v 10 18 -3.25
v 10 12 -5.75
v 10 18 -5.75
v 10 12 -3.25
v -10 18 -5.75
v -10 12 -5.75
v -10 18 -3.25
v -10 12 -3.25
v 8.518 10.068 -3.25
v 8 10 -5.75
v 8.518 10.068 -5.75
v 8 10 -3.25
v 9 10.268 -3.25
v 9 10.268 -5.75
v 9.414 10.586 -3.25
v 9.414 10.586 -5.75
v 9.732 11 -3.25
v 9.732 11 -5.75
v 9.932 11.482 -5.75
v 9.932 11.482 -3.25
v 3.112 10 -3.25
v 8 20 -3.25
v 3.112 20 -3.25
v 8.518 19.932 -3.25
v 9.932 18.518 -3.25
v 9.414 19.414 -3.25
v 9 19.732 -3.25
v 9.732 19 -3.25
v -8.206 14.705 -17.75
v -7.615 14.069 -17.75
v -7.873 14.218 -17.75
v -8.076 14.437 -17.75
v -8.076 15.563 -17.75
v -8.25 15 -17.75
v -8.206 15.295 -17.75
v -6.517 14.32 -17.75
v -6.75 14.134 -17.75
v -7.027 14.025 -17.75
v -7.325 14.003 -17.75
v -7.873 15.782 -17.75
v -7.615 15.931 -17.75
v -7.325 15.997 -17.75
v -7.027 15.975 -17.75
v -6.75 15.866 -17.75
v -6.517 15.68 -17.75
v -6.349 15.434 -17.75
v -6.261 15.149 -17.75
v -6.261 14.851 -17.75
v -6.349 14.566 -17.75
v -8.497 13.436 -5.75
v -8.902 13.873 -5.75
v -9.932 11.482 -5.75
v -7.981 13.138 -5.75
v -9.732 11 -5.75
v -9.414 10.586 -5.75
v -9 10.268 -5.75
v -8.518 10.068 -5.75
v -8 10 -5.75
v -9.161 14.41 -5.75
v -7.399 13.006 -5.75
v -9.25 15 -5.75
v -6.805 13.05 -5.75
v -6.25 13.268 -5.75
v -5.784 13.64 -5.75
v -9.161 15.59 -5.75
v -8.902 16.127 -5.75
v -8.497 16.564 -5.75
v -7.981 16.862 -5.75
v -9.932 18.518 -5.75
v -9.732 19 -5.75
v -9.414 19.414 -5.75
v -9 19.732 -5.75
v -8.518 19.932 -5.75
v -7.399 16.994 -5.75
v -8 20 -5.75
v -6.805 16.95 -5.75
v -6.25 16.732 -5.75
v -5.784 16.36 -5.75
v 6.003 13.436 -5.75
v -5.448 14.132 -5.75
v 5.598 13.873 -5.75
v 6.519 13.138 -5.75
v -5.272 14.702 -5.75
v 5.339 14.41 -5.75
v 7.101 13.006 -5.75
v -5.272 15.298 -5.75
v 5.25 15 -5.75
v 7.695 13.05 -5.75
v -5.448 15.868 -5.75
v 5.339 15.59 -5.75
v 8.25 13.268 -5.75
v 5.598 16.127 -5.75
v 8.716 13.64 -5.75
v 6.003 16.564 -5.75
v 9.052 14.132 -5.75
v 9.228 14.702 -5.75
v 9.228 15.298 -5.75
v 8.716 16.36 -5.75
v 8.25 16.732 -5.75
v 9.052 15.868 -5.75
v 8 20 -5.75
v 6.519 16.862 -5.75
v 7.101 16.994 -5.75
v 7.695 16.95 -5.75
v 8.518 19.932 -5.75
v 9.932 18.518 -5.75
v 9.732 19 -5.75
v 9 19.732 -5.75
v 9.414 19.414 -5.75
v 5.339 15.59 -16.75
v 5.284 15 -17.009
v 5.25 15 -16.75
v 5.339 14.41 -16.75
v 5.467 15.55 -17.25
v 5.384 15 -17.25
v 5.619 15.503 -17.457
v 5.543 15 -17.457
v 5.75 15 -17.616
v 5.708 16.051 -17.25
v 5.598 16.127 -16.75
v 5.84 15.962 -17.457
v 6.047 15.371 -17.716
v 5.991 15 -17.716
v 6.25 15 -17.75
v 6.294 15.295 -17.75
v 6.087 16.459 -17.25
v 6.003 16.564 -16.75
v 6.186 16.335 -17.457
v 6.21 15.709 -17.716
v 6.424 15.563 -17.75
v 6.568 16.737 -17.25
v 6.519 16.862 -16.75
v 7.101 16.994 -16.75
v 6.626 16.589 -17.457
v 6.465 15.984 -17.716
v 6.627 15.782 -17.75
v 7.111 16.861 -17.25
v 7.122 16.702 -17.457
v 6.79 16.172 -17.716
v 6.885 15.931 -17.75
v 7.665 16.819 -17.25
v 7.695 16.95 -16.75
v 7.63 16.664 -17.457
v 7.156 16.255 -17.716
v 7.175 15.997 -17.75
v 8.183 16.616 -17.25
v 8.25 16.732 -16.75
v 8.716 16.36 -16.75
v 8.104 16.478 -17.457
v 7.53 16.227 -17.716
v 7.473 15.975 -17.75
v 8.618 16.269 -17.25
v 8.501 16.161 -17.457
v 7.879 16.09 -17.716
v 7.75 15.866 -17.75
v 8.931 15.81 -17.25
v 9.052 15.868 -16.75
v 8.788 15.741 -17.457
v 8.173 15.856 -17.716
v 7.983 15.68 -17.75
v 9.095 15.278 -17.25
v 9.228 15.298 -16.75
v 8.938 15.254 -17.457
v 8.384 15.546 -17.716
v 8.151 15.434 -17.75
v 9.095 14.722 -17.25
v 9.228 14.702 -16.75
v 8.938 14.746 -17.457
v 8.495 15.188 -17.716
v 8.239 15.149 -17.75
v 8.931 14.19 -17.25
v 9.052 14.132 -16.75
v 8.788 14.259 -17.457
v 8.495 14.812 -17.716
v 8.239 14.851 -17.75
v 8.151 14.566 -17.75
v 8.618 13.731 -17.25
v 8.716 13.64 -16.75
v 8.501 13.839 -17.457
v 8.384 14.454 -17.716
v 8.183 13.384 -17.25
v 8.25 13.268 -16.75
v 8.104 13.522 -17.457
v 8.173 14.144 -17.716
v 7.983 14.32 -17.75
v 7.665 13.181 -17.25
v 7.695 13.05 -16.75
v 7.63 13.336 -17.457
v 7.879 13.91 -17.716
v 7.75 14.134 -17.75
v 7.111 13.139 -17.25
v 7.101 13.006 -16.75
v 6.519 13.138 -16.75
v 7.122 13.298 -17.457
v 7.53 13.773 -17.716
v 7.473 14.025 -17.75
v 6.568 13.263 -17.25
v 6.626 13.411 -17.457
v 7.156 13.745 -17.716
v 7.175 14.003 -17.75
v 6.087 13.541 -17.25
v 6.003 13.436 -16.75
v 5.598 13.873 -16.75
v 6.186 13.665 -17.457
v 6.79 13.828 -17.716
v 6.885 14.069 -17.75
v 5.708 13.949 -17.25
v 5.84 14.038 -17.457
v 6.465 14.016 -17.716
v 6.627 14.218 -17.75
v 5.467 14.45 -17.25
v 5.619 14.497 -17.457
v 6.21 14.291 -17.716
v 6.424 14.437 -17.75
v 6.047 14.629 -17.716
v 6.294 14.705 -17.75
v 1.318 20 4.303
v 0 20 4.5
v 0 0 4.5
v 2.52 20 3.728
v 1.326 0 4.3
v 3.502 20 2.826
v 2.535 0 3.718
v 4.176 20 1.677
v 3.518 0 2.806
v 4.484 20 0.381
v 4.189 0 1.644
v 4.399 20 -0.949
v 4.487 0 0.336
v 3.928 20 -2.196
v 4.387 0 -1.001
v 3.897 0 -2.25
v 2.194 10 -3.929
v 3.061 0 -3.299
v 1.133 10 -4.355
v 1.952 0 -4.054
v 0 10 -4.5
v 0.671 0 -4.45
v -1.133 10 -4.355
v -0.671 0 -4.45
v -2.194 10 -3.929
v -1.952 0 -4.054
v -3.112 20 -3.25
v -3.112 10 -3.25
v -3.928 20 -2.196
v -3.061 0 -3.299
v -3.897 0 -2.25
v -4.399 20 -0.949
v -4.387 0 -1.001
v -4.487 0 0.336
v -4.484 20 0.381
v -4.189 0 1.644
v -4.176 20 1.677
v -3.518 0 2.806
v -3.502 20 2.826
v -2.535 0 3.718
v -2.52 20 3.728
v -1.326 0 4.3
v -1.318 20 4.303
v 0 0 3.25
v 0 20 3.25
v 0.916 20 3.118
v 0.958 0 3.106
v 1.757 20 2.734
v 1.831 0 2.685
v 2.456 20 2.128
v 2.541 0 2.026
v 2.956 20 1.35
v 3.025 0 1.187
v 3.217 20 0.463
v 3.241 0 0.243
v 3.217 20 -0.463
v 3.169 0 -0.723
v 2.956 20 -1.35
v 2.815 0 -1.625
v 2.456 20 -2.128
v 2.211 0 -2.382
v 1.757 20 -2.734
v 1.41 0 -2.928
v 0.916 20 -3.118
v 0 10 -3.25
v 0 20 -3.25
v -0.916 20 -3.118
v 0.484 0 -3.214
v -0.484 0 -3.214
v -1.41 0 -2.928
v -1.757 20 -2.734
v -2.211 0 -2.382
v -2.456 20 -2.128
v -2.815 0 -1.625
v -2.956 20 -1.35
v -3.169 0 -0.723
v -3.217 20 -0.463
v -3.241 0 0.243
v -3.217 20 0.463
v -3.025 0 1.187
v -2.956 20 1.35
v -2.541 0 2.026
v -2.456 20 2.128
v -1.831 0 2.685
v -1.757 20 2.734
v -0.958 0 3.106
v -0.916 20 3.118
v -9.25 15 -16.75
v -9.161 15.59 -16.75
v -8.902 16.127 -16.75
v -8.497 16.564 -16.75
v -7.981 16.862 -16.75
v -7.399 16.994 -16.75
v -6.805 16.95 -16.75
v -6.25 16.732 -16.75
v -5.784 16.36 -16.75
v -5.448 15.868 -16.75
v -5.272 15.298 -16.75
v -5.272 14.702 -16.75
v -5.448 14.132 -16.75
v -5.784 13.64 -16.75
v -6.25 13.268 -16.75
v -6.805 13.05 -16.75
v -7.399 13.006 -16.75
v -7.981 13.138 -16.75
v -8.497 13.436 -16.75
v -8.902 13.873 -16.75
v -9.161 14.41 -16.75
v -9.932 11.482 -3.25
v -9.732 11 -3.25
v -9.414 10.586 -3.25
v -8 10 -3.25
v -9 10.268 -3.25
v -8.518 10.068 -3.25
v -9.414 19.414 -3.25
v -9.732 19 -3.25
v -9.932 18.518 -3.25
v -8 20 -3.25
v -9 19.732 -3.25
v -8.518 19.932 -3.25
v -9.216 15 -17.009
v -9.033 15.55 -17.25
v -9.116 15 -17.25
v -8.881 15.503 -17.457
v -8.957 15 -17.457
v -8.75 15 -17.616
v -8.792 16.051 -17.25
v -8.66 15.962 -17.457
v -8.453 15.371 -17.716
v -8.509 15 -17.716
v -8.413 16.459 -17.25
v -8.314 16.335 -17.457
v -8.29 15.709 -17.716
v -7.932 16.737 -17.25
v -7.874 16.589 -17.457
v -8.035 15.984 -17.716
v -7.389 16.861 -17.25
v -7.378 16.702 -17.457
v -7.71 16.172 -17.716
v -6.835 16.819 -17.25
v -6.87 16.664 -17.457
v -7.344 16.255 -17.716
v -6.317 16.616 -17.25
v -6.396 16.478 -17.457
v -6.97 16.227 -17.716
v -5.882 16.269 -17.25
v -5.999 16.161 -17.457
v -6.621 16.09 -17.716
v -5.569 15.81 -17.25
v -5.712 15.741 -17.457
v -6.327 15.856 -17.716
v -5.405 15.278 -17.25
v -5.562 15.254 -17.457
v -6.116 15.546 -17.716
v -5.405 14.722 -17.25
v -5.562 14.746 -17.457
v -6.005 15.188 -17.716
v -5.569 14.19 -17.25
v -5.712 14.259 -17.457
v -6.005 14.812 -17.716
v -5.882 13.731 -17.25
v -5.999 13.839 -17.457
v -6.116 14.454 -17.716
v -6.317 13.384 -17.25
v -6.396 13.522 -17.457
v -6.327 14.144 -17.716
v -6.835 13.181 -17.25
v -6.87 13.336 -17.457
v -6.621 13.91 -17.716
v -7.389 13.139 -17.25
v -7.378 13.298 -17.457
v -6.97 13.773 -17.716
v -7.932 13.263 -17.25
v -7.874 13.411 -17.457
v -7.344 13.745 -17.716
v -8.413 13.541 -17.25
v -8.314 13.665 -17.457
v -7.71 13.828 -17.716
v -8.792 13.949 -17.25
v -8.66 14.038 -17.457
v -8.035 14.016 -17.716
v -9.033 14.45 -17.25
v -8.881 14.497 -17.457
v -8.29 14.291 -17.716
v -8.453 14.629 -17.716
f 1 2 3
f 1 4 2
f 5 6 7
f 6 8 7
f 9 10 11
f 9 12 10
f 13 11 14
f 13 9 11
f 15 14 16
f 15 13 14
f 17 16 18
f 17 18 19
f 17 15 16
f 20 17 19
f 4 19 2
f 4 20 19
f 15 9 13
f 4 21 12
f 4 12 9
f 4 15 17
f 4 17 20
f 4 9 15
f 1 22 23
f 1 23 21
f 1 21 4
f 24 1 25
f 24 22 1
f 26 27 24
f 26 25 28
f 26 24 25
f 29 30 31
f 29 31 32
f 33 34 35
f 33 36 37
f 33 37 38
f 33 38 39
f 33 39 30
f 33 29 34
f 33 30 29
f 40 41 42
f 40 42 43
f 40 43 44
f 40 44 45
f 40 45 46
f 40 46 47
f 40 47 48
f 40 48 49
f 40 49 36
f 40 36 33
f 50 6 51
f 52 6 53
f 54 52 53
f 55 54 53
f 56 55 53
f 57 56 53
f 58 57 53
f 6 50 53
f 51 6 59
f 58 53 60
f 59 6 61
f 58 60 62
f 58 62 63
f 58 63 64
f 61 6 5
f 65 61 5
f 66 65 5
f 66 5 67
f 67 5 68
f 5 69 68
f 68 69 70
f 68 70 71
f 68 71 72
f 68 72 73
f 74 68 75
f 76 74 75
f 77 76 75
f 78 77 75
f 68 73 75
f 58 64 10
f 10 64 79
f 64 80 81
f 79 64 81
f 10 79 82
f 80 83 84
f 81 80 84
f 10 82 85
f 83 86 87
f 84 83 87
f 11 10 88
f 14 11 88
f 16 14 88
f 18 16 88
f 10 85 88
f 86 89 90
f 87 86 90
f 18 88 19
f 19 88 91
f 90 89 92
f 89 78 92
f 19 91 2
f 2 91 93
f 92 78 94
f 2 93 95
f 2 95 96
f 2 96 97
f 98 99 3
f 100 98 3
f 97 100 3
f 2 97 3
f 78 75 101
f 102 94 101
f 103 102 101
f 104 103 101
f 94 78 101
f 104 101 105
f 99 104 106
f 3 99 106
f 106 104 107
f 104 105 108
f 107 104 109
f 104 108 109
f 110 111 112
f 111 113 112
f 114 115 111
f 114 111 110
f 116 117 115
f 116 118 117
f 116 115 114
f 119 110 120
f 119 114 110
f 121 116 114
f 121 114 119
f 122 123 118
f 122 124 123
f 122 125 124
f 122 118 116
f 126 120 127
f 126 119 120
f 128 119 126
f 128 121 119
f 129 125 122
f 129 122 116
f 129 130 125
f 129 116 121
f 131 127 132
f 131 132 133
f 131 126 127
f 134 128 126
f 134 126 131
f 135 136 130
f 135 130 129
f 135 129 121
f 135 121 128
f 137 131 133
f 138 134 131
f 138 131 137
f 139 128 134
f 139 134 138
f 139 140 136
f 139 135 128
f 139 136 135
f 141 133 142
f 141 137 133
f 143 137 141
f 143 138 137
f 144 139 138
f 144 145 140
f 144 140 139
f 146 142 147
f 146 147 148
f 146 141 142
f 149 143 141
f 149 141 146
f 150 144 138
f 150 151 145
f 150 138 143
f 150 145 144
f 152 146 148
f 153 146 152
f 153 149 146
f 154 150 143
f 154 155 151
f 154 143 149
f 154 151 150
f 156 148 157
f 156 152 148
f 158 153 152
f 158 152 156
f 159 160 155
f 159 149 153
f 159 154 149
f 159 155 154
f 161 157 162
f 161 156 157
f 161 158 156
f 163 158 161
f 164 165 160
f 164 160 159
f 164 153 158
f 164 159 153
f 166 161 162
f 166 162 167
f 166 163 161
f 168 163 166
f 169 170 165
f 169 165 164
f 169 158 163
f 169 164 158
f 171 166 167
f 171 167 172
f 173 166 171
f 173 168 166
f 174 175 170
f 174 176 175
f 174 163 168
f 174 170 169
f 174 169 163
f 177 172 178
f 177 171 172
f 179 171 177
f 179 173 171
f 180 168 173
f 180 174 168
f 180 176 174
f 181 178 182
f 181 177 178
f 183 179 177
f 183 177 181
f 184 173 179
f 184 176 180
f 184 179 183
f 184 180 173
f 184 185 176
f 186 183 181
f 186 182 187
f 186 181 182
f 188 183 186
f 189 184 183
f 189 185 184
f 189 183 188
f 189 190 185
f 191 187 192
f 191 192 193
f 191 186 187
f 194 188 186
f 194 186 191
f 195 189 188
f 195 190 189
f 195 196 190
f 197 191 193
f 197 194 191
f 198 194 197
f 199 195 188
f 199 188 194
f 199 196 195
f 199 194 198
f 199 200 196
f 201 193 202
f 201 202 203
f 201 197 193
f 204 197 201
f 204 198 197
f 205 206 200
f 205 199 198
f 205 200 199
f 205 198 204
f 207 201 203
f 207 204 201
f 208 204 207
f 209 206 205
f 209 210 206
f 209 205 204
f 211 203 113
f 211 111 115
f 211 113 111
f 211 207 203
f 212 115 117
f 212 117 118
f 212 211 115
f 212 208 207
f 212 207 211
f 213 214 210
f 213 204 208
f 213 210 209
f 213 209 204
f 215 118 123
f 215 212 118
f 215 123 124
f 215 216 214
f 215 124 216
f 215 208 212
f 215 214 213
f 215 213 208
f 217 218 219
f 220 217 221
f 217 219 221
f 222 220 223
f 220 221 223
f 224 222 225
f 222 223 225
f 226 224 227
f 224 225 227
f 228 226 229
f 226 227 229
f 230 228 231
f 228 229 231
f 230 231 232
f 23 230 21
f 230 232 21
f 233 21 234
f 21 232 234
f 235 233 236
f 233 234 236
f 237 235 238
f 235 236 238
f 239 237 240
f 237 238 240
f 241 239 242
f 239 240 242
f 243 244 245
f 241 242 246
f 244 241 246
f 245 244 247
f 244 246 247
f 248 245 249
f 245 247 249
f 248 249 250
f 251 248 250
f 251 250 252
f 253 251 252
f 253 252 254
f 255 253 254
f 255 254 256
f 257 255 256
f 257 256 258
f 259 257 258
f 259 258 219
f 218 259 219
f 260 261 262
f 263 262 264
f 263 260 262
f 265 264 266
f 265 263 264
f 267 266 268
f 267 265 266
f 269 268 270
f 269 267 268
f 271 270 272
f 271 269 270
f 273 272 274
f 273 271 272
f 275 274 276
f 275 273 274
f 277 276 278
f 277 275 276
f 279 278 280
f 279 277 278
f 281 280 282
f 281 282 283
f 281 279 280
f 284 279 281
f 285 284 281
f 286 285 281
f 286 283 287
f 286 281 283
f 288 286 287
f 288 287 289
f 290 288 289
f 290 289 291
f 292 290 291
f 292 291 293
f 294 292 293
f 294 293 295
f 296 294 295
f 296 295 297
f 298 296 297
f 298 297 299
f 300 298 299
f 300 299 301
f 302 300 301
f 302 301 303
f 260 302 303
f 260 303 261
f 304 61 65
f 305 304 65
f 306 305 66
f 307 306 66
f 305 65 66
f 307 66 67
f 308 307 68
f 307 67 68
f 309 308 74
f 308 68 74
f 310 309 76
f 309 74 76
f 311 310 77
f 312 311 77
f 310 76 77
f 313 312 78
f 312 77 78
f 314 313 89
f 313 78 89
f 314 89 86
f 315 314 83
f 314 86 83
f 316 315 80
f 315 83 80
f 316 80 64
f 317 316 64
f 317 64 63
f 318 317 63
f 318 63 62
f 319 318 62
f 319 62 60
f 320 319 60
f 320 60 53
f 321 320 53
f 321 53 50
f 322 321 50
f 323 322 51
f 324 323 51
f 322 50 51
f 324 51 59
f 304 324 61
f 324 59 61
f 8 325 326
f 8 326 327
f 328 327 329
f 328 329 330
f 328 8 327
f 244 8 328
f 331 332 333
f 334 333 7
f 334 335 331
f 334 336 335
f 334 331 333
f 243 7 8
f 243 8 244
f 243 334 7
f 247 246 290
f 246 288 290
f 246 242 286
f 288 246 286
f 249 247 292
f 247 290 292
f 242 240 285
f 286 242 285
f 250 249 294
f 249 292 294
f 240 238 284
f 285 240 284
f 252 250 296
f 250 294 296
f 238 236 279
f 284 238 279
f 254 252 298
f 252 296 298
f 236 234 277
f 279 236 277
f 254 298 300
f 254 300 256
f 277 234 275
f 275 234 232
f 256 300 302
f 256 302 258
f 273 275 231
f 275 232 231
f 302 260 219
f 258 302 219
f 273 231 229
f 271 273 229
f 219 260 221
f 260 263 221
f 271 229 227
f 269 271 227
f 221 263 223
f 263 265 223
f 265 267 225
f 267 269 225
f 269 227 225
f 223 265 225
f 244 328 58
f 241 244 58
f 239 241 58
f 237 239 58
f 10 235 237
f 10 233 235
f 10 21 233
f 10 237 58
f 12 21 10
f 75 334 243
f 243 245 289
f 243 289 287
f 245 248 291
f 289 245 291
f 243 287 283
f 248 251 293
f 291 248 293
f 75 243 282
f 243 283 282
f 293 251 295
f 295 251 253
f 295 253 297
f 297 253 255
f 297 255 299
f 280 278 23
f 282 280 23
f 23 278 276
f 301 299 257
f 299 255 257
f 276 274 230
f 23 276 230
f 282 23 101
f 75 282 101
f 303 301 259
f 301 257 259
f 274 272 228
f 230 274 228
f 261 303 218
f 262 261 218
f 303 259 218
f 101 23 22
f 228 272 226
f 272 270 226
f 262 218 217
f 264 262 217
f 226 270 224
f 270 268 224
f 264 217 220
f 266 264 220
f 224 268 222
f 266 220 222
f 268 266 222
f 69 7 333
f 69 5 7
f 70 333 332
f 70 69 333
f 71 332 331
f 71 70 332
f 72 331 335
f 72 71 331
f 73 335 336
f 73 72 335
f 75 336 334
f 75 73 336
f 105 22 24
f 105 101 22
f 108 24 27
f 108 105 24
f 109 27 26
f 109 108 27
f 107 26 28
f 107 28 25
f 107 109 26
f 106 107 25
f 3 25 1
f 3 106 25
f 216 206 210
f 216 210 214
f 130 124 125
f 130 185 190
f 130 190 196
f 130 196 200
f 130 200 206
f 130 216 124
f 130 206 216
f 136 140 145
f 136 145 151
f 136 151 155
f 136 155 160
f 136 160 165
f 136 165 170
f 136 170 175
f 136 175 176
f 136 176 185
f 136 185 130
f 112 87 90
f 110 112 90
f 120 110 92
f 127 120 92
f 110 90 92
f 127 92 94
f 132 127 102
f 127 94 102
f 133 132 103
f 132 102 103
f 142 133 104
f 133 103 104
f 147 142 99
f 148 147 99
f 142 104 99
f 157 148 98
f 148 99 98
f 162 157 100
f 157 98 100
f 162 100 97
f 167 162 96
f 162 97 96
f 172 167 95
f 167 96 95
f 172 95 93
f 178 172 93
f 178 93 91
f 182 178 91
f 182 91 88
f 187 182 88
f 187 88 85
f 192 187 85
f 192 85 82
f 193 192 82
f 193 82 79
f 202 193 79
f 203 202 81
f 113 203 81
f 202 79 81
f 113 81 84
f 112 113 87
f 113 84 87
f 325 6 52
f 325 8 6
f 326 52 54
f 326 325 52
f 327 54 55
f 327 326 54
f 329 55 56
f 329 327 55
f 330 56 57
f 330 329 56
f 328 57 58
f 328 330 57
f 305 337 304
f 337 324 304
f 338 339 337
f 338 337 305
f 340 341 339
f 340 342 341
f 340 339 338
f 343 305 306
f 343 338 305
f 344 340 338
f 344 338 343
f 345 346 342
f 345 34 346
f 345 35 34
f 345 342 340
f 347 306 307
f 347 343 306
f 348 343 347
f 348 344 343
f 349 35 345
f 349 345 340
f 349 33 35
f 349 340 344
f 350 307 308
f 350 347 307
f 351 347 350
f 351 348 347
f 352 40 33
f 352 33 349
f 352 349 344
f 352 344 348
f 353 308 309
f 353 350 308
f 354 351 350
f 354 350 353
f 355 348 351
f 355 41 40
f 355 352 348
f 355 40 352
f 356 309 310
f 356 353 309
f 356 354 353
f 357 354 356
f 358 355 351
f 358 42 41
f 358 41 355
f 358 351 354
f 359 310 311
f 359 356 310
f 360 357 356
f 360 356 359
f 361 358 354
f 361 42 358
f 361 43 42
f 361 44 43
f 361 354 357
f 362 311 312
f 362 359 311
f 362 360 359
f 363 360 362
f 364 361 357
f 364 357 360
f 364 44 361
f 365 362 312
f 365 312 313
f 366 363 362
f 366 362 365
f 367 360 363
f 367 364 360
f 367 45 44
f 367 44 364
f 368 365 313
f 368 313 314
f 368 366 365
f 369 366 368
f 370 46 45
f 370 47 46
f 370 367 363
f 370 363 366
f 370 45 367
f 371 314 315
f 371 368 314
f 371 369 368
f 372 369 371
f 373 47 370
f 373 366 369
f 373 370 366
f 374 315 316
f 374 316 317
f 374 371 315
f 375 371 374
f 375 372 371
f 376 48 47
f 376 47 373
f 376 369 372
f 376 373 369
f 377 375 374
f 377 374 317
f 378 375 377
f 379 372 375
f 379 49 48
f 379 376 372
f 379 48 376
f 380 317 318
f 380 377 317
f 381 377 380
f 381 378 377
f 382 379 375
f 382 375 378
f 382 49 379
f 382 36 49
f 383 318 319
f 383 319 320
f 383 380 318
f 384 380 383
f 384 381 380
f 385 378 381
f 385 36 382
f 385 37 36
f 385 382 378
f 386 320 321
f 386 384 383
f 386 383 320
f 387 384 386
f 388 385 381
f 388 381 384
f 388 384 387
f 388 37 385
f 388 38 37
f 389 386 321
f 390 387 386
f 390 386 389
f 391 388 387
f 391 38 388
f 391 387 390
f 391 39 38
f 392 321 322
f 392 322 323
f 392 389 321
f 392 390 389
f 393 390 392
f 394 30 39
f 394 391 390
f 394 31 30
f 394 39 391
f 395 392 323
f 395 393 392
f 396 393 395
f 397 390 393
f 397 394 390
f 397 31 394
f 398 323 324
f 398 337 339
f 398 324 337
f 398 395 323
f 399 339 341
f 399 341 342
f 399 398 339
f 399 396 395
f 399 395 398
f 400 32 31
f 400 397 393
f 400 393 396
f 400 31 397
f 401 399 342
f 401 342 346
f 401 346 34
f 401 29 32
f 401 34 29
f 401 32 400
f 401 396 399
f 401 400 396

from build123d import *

# Parameters (mm, degrees)
SKETCH1_R           = 4.5
SKETCH1_R_2         = 3.25
BOSS_EXTRUDE1_DEPTH = 20
SKETCH2_W           = 20
SKETCH2_H           = 10
BOSS_EXTRUDE2_DEPTH = 1.25
FILLET1_R           = 2
SKETCH3_R           = 2
BOSS_EXTRUDE3_DEPTH = 12
LPATTERN3_COUNT     = 2
LPATTERN3_PITCH     = 14.5
FILLET2_R           = 1


with BuildPart() as part:
    # Sketch1 → Boss-Extrude1 (new body)
    with BuildSketch(Plane(origin=(0, 0, 0), x_dir=(1, 0, 0), z_dir=(0, 1, 0))):
        Circle(SKETCH1_R)
        Circle(SKETCH1_R_2, mode=Mode.SUBTRACT)
    extrude(amount=BOSS_EXTRUDE1_DEPTH)

    # Sketch2 → Boss-Extrude2 (add, symmetric)
    with BuildSketch(Plane.XY.offset(-4.5)):
        with Locations((0, 15)):
            Rectangle(SKETCH2_W, SKETCH2_H)
    extrude(amount=BOSS_EXTRUDE2_DEPTH, both=True)

    # Fillet1
    fillet1_edges = [part.edges().sort_by_distance(p)[0] for p in [
        (-10, 10, -4.5),
        (-10, 20, -4.5),
        (10, 10, -4.5),
        (10, 20, -4.5),
    ]]
    fillet(fillet1_edges, radius=FILLET1_R)

    # Sketch3 → Boss-Extrude3 (add)
    with BuildSketch(Plane(origin=(0, 0, -5.75), x_dir=(-1, 0, 0), z_dir=(0, 0, -1))):
        with Locations((-7.25, 15)):
            Circle(SKETCH3_R)
    boss_extrude3 = extrude(amount=BOSS_EXTRUDE3_DEPTH)

    # LPattern3: Boss-Extrude3 ×2
    with Locations(*[(-i * LPATTERN3_PITCH, 0, 0) for i in range(1, LPATTERN3_COUNT)]):
        add(boss_extrude3)

    # Fillet2
    fillet2_edges = [part.edges().sort_by_distance(p)[0] for p in [
        (-5.25, 15, -17.75),
        (9.25, 15, -17.75),
    ]]
    fillet(fillet2_edges, radius=FILLET2_R)


solid = part.part
